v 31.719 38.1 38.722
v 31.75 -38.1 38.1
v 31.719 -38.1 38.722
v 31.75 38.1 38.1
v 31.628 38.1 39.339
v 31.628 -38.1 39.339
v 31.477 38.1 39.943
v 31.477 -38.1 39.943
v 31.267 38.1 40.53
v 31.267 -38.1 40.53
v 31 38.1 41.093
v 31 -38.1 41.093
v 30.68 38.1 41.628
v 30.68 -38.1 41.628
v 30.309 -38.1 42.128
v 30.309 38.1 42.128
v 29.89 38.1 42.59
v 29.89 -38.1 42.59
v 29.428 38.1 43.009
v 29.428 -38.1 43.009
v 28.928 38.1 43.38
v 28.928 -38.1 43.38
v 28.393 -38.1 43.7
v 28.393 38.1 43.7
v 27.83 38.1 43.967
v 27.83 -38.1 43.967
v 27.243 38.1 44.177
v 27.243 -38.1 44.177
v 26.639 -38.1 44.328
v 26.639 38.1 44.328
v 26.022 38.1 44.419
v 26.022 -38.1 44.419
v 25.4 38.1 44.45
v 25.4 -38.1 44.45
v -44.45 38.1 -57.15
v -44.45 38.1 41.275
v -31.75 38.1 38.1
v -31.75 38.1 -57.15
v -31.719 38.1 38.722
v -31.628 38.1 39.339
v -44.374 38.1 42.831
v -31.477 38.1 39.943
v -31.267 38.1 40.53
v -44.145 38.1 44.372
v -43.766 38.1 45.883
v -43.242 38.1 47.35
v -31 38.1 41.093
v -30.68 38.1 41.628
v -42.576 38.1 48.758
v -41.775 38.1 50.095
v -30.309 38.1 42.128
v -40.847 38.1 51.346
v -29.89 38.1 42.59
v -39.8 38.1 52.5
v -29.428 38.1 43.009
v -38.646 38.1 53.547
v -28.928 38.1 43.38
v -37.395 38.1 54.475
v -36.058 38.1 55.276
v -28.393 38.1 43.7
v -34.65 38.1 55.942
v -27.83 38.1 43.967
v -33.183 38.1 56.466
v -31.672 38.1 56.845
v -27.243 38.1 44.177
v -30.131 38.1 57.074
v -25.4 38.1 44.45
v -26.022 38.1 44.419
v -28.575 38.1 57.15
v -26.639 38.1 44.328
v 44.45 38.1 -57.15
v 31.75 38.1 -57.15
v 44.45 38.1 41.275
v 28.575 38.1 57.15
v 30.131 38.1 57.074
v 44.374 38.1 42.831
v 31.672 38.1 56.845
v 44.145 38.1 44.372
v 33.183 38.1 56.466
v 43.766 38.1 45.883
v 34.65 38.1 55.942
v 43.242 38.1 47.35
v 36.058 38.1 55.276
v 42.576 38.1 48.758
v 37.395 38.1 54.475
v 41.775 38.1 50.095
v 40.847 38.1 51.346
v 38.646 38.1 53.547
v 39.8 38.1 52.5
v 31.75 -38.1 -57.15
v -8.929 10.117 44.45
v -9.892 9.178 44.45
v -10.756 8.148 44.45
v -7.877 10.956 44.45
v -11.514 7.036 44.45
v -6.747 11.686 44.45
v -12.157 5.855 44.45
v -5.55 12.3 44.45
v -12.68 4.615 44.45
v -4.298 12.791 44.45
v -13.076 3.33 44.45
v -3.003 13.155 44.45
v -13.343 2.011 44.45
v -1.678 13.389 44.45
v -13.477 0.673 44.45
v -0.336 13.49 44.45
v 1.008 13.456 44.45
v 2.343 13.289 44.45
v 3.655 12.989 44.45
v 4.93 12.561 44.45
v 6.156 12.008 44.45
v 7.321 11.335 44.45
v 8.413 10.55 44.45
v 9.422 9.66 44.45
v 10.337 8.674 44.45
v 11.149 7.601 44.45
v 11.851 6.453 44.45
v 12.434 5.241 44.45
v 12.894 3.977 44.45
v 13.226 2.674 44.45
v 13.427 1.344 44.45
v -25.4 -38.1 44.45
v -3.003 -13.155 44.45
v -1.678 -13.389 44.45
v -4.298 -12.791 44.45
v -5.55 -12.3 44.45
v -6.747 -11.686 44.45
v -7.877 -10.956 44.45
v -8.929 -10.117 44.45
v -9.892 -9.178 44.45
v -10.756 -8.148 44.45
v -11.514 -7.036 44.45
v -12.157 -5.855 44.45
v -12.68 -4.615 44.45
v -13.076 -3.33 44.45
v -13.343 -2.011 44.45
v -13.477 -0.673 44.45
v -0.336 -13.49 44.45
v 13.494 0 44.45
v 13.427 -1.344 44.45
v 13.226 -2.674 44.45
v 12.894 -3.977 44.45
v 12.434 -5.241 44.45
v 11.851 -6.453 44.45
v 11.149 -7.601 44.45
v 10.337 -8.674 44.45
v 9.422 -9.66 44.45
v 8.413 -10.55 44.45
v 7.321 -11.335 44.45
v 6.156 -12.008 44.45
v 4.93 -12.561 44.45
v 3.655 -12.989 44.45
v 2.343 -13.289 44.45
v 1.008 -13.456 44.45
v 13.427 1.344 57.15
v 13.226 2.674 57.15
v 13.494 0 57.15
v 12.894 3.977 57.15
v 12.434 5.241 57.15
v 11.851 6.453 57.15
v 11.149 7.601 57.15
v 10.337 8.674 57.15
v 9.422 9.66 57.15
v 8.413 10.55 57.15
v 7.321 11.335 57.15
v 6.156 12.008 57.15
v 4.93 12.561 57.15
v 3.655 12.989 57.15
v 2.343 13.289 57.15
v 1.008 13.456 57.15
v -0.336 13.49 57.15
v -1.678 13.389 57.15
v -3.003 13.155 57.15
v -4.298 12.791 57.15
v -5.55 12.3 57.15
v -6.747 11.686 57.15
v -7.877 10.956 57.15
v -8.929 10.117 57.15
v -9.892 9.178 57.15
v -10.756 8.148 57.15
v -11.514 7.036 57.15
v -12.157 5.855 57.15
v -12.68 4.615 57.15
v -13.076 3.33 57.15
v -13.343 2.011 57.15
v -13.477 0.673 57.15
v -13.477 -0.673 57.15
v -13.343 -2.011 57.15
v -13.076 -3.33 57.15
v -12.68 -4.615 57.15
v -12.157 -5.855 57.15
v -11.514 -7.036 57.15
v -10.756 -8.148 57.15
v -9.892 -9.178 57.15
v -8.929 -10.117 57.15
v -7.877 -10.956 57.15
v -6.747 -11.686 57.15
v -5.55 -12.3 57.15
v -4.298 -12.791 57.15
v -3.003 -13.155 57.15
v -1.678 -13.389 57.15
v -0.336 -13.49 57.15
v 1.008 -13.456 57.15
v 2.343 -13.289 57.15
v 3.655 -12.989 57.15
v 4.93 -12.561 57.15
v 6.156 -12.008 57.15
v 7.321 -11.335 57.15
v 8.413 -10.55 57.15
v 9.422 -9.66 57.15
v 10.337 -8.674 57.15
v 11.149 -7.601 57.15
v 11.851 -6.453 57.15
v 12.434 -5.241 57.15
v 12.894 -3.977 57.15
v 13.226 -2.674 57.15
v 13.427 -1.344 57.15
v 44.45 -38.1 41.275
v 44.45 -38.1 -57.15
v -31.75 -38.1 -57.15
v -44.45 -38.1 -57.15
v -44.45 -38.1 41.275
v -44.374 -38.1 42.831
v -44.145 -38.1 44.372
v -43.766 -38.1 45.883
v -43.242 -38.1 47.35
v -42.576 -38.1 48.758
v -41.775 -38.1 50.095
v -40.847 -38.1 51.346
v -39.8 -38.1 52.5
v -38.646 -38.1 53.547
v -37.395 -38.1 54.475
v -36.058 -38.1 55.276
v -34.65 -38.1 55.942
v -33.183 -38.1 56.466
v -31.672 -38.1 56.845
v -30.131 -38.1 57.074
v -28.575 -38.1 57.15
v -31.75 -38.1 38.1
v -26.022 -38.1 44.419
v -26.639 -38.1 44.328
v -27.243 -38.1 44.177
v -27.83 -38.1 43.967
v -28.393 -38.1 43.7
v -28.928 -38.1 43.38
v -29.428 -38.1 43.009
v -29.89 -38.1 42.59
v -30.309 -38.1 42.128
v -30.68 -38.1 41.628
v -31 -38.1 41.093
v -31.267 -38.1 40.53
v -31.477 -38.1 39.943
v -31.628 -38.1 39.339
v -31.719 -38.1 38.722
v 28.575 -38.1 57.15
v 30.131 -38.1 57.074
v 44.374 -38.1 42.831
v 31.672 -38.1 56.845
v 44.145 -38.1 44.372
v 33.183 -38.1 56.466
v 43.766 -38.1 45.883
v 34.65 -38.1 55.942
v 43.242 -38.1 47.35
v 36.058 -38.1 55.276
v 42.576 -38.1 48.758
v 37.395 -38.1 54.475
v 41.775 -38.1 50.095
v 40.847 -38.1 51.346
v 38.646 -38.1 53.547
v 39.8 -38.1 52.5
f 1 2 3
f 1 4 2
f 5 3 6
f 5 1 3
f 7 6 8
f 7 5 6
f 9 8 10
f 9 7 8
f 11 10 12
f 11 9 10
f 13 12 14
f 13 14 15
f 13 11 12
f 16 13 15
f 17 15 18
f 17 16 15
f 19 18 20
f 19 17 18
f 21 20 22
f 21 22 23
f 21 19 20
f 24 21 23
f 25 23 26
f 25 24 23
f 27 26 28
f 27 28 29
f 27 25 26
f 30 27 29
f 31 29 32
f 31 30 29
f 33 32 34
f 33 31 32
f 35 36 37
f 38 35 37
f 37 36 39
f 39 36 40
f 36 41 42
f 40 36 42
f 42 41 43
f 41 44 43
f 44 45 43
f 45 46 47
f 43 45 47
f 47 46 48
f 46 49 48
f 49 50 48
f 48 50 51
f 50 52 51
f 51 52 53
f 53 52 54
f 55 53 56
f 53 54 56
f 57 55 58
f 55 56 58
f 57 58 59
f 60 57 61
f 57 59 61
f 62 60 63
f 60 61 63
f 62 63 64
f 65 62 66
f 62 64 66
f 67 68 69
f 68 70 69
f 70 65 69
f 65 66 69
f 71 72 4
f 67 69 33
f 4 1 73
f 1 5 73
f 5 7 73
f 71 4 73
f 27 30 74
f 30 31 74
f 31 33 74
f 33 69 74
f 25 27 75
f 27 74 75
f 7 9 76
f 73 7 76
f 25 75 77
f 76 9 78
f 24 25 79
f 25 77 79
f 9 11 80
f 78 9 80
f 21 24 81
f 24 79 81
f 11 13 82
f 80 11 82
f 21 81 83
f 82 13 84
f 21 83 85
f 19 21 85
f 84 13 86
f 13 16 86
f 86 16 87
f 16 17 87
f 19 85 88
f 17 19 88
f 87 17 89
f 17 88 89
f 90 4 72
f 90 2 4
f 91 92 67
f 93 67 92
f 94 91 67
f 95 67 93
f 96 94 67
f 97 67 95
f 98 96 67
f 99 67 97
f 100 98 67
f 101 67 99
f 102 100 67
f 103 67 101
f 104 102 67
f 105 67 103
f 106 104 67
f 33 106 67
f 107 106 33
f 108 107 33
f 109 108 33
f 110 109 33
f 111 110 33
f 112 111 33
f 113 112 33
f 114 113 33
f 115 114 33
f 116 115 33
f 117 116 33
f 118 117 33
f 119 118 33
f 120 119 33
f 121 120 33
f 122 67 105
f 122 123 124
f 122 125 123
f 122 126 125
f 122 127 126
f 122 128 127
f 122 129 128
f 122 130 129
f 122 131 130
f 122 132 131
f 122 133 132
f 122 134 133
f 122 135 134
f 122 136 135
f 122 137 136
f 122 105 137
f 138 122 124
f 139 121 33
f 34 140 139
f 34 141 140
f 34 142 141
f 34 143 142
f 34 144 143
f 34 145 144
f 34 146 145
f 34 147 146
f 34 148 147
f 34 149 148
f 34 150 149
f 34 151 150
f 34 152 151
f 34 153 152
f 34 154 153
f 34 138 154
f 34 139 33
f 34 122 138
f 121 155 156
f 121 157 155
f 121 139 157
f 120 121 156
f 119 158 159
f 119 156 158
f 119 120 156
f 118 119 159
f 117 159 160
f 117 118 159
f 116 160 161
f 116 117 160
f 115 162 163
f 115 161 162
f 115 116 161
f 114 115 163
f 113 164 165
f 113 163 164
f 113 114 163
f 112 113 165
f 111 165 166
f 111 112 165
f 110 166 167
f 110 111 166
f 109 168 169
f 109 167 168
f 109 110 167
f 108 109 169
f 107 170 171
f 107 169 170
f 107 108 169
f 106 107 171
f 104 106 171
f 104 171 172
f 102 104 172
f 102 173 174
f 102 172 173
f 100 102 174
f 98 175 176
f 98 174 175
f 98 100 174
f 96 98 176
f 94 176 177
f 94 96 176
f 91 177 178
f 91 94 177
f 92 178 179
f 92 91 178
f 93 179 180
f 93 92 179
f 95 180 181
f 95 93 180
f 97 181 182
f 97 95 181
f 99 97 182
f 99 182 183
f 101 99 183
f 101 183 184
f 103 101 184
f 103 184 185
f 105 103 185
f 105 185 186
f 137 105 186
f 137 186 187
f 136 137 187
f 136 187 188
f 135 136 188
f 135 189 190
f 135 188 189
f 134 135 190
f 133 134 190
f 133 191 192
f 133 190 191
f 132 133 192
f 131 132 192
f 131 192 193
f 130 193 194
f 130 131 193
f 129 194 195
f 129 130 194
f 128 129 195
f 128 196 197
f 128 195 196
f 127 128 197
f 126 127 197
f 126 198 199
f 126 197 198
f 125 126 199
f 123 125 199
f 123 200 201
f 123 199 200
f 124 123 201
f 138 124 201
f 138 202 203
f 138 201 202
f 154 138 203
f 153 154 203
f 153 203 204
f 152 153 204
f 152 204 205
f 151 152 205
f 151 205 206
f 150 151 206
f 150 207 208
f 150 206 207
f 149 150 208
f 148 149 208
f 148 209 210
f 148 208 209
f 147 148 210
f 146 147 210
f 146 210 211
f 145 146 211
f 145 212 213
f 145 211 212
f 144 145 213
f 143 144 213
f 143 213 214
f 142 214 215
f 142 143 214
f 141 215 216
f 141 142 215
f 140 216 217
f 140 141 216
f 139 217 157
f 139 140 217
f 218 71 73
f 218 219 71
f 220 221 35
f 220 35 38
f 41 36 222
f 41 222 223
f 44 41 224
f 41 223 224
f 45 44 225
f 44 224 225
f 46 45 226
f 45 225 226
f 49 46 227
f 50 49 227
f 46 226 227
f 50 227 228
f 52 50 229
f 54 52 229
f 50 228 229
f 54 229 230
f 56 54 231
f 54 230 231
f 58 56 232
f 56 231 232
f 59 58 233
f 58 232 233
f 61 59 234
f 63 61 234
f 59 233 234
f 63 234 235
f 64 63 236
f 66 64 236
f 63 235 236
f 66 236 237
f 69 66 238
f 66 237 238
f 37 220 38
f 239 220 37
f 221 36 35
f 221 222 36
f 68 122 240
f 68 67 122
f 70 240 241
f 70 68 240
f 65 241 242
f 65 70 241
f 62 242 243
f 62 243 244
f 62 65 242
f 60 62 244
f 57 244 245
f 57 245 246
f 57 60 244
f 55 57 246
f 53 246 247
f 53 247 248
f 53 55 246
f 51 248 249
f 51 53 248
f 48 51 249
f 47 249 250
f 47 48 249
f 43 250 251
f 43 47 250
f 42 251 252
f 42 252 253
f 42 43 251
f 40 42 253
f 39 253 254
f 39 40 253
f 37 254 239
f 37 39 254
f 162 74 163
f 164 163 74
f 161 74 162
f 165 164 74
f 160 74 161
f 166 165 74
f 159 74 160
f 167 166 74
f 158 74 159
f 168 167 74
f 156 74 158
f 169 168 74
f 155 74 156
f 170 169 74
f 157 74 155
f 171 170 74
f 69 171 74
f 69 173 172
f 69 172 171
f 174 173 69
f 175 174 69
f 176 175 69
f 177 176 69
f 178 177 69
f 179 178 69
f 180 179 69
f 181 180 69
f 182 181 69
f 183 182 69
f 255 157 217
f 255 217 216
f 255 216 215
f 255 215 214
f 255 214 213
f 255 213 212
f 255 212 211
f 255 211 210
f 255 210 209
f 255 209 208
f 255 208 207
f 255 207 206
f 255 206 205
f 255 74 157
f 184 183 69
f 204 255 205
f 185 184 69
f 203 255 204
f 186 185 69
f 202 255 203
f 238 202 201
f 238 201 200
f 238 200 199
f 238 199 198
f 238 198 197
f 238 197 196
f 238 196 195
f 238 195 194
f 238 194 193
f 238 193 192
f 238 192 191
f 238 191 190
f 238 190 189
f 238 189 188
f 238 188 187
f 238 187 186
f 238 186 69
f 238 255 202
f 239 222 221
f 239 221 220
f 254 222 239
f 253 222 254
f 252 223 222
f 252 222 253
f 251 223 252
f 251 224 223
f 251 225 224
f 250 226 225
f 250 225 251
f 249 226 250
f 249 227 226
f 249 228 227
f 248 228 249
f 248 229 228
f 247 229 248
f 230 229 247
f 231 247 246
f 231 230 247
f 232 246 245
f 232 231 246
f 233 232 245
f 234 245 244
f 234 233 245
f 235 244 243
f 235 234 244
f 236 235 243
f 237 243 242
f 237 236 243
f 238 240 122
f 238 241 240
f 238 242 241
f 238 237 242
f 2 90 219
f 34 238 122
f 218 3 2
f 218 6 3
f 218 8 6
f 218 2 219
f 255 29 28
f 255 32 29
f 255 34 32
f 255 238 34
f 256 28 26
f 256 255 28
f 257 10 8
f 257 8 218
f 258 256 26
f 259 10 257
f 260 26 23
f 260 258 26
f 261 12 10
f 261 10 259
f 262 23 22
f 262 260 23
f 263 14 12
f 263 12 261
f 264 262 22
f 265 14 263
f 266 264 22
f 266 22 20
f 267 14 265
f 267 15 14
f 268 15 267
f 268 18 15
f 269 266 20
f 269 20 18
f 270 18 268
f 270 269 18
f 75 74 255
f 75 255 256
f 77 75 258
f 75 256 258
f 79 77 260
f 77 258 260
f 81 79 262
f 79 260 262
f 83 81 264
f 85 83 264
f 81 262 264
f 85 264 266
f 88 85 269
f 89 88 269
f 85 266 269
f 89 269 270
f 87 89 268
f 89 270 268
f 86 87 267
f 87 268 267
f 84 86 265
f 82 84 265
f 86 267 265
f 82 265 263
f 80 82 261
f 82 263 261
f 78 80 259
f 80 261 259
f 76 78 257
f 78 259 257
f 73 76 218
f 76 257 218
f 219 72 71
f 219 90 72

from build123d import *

# Parameters (mm, degrees)
F1_DEPTH = 38.1
F2_R     = 6.35
F3_R     = 15.875
F4_R     = 13.49375
F5_DEPTH = 57.151


with BuildPart() as f1:
    # F0 (on Front) → F1 (new body, symmetric)
    with BuildSketch(Plane.XZ):
        Polygon((31.75, -57.15), (44.45, -57.15), (44.45, 57.15), (-44.45, 57.15), (-44.45, -57.15), (-31.75, -57.15), (-31.75, 44.45), (31.75, 44.45), align=None)
    extrude(amount=F1_DEPTH, both=True)

    # F2
    f2_edges = [f1.edges().sort_by_distance(p)[0] for p in [
        (-31.75, 0, 44.45),
        (31.75, 0, 44.45),
    ]]
    fillet(f2_edges, radius=F2_R)

    # F3
    f3_edges = [f1.edges().sort_by_distance(p)[0] for p in [
        (-44.45, 0, 57.15),
        (44.45, 0, 57.15),
    ]]
    fillet(f3_edges, radius=F3_R)

    # F4 (on Top) → F5 (cut, through all)
    with BuildSketch(Plane.XY):
        Circle(F4_R)
    extrude(amount=F5_DEPTH, mode=Mode.SUBTRACT)


solid = f1.part
